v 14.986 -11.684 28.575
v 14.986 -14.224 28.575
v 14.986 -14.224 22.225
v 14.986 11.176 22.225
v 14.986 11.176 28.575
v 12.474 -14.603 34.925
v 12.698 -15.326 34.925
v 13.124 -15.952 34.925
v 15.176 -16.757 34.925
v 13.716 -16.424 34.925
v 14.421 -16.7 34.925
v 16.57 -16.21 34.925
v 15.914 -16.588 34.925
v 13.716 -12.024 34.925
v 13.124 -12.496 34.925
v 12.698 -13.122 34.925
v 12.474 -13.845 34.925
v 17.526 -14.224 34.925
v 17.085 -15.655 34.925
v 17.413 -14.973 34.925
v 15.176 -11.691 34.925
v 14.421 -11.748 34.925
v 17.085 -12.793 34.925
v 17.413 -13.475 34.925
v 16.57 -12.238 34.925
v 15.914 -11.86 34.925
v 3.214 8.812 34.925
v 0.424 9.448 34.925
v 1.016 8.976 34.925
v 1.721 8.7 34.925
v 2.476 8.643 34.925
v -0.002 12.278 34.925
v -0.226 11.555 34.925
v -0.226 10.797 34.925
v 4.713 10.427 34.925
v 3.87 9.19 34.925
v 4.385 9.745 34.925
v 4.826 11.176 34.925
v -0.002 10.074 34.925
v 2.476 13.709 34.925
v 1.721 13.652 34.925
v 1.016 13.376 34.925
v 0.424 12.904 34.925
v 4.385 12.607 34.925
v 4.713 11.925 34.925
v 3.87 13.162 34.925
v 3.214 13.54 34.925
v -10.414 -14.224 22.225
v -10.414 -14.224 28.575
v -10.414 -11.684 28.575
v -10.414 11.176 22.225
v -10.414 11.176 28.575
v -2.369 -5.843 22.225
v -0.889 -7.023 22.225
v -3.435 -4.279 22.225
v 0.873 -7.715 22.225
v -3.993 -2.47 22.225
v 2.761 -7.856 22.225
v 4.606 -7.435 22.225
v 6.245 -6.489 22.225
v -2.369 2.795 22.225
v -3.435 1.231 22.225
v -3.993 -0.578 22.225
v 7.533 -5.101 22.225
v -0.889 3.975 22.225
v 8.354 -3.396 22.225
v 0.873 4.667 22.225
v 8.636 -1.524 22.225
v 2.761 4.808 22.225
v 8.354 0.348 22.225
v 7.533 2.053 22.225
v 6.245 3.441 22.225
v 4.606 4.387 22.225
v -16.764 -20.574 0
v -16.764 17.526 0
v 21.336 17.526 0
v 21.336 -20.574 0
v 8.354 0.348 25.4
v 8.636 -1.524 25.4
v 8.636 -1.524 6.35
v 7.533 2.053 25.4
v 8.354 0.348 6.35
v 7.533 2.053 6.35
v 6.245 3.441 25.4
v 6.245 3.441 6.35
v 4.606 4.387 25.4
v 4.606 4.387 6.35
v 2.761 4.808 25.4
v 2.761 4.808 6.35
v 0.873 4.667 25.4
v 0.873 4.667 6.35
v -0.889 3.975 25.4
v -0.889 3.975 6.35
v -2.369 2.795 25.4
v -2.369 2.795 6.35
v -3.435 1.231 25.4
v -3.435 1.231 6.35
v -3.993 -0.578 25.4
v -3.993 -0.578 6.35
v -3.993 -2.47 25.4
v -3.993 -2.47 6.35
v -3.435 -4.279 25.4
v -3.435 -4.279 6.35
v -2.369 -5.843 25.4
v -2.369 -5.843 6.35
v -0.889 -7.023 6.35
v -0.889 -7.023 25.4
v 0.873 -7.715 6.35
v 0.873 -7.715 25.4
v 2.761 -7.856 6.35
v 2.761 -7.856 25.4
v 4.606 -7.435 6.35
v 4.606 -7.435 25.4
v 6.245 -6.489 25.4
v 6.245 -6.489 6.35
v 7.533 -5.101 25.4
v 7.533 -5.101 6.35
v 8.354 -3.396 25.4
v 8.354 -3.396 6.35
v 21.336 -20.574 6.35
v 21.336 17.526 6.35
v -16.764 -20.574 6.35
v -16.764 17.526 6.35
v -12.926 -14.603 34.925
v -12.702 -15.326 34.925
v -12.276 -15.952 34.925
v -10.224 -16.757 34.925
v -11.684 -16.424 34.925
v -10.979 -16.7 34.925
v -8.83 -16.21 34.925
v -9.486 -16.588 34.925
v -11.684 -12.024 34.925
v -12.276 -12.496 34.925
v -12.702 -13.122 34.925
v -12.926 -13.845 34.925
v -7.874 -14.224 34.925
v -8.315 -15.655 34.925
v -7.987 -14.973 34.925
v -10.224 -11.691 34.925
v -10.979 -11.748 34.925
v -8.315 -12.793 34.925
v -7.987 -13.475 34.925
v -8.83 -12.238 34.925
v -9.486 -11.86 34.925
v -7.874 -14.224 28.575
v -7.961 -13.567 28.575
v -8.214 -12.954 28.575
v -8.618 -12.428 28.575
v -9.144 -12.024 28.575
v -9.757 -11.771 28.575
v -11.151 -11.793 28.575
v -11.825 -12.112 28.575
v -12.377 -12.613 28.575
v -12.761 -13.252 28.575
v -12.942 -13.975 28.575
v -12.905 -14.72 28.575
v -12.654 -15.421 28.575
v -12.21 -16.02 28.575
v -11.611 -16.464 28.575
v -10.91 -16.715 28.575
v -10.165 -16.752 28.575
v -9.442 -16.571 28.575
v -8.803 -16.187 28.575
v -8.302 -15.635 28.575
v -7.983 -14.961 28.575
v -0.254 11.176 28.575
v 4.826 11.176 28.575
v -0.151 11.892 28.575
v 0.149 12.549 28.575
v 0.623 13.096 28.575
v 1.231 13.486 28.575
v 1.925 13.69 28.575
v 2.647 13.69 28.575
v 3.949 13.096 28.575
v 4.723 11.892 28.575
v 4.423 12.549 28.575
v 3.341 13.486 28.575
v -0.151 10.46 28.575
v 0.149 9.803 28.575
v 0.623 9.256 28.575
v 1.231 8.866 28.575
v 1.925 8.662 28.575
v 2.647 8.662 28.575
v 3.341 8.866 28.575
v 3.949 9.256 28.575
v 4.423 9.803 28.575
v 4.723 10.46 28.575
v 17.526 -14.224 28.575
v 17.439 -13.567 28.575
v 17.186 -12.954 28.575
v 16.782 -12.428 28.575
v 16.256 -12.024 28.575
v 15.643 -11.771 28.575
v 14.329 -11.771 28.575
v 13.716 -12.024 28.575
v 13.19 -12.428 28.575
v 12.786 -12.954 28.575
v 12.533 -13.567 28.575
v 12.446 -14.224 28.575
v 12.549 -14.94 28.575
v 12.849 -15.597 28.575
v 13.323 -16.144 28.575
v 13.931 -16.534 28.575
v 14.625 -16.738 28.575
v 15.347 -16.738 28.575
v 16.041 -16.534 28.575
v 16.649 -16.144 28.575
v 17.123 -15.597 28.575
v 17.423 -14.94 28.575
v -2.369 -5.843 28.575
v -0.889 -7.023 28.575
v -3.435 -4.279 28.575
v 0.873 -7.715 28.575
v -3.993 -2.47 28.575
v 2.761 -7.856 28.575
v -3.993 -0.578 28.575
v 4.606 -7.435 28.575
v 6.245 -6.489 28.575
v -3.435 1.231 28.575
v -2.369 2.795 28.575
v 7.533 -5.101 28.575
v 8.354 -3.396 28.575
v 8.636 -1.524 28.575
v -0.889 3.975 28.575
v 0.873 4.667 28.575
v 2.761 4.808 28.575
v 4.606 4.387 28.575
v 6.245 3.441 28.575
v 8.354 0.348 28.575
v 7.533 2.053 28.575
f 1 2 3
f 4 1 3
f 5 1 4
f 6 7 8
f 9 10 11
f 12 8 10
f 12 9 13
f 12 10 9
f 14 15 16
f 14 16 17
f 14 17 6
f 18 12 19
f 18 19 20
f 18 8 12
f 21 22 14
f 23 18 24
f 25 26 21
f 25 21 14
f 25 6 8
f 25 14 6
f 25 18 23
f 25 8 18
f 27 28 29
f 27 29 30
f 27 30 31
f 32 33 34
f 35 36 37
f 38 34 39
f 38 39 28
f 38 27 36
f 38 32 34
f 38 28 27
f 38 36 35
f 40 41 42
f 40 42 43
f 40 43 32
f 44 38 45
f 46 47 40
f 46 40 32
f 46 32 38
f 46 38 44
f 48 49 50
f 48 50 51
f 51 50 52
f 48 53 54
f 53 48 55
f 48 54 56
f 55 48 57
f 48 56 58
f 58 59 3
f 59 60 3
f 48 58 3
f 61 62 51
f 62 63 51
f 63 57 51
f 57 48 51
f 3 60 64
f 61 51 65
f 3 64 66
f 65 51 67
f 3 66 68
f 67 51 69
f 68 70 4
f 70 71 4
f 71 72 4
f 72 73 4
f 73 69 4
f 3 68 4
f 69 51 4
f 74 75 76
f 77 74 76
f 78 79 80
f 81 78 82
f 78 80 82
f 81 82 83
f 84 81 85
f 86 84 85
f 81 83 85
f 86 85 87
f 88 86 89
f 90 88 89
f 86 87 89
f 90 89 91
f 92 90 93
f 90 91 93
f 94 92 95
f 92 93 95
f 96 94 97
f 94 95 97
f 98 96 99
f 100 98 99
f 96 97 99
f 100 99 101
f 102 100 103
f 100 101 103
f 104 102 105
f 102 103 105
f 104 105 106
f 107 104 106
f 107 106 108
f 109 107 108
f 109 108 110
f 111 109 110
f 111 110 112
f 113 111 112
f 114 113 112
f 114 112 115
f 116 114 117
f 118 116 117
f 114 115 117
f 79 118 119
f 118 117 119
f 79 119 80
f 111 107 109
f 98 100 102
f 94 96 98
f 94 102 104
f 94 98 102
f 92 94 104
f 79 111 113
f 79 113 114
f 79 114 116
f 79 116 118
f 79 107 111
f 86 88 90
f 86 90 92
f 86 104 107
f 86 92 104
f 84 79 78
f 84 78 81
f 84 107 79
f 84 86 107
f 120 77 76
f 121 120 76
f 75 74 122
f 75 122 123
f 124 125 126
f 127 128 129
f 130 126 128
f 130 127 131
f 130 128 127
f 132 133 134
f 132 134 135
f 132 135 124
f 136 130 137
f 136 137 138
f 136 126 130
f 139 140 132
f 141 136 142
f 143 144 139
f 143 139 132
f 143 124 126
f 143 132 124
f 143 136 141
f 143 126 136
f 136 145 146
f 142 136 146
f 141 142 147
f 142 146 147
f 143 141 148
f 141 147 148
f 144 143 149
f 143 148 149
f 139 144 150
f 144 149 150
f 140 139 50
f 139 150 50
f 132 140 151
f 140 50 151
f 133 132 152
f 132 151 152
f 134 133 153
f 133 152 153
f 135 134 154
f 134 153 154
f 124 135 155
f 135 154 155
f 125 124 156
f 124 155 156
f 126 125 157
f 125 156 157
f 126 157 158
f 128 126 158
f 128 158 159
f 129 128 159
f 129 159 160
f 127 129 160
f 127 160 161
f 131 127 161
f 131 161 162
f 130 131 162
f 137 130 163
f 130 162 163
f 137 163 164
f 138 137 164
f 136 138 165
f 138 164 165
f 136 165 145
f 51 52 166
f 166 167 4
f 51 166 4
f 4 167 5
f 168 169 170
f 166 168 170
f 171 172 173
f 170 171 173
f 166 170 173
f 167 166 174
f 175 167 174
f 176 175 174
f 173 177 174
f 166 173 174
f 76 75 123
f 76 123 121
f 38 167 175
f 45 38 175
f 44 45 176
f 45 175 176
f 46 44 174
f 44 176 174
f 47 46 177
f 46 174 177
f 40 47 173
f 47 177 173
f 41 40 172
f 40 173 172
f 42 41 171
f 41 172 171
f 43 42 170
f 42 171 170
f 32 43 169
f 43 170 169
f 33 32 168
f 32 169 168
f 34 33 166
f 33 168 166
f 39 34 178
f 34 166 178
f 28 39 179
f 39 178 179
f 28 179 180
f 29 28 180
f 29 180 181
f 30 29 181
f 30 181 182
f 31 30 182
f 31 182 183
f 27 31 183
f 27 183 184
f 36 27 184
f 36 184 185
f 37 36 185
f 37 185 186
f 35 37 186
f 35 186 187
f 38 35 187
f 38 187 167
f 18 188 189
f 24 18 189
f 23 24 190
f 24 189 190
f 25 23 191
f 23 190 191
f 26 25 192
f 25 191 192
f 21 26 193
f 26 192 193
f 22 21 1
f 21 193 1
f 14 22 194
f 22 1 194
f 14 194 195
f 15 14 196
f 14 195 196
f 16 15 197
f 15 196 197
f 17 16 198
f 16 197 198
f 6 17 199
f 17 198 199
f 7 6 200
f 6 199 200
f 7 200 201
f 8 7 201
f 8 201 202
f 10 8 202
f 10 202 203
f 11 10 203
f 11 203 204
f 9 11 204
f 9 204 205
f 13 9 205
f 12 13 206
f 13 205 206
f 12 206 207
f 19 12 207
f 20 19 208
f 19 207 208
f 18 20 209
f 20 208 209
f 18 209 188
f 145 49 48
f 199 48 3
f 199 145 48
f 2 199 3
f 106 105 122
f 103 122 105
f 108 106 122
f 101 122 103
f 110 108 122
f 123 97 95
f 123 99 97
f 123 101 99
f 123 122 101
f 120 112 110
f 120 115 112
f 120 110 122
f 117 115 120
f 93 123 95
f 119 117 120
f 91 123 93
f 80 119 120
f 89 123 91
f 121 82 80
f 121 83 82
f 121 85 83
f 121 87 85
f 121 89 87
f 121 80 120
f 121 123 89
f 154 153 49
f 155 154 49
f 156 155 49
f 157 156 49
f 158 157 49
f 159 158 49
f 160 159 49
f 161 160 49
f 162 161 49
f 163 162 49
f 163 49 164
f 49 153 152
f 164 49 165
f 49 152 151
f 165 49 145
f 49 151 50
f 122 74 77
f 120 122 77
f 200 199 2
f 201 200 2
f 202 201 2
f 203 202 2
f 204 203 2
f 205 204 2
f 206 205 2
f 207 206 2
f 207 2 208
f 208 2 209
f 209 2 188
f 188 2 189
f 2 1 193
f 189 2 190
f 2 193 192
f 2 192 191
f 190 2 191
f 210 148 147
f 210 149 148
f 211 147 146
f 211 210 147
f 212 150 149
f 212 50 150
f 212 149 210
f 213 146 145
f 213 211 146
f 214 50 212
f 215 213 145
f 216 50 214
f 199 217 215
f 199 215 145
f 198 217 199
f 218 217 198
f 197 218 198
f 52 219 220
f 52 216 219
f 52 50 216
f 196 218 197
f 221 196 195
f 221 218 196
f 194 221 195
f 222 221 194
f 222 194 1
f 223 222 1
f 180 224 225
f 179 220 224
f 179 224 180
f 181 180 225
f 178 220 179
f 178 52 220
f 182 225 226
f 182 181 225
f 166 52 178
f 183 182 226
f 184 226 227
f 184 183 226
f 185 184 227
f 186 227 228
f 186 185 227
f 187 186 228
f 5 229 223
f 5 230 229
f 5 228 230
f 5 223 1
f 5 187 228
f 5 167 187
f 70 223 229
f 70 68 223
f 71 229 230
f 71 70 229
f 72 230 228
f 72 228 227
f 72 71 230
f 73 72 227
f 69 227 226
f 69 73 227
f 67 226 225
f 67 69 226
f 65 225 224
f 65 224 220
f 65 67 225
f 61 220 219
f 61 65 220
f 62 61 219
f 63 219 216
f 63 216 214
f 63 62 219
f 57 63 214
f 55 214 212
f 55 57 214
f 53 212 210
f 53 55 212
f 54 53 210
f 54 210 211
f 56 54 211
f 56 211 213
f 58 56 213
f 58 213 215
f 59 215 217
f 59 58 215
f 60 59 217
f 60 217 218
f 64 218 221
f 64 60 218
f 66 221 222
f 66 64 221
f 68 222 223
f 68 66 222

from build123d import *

# Parameters (mm, degrees)
F0_W     = 38.1
F0_H     = 38.1
F1_DEPTH = 6.35
F2_R     = 6.35
F3_DEPTH = 19.05
F4_W     = 25.4
F4_H     = 25.4
F4_R     = 6.35
F5_DEPTH = 3.175
F6_R     = 2.54
F7_DEPTH = 6.35


with BuildPart() as f1:
    # F0 (on Top) → F1 (new body)
    with BuildSketch(Plane.XY):
        with Locations((2.285996, -1.524001)):
            Rectangle(F0_W, F0_H)
    extrude(amount=F1_DEPTH)

    # F2 (on face) → F3 (join)
    with BuildSketch(Plane.XY.offset(6.35)):
        with Locations((2.285996, -1.524001)):
            Circle(F2_R)
    extrude(amount=F3_DEPTH)


with BuildPart() as f5:
    # F4 (on face) → F5 (new body, symmetric)
    with BuildSketch(Plane.XY.offset(25.4)):
        with Locations((2.285996, -1.524001)):
            Rectangle(F4_W, F4_H)
        with Locations((2.285996, -1.524001)):
            Circle(F4_R, mode=Mode.SUBTRACT)
    extrude(amount=F5_DEPTH, both=True)

    # F6 (on face) → F7 (join)
    with BuildSketch(Plane.XY.offset(28.575)):
        with Locations((-10.414004, -14.224001)):
            Circle(F6_R)
        with Locations((14.985996, -14.224001)):
            Circle(F6_R)
        with Locations((2.285996, 11.175999)):
            Circle(F6_R)
    extrude(amount=F7_DEPTH)


solid = Compound([f1.part, f5.part])
